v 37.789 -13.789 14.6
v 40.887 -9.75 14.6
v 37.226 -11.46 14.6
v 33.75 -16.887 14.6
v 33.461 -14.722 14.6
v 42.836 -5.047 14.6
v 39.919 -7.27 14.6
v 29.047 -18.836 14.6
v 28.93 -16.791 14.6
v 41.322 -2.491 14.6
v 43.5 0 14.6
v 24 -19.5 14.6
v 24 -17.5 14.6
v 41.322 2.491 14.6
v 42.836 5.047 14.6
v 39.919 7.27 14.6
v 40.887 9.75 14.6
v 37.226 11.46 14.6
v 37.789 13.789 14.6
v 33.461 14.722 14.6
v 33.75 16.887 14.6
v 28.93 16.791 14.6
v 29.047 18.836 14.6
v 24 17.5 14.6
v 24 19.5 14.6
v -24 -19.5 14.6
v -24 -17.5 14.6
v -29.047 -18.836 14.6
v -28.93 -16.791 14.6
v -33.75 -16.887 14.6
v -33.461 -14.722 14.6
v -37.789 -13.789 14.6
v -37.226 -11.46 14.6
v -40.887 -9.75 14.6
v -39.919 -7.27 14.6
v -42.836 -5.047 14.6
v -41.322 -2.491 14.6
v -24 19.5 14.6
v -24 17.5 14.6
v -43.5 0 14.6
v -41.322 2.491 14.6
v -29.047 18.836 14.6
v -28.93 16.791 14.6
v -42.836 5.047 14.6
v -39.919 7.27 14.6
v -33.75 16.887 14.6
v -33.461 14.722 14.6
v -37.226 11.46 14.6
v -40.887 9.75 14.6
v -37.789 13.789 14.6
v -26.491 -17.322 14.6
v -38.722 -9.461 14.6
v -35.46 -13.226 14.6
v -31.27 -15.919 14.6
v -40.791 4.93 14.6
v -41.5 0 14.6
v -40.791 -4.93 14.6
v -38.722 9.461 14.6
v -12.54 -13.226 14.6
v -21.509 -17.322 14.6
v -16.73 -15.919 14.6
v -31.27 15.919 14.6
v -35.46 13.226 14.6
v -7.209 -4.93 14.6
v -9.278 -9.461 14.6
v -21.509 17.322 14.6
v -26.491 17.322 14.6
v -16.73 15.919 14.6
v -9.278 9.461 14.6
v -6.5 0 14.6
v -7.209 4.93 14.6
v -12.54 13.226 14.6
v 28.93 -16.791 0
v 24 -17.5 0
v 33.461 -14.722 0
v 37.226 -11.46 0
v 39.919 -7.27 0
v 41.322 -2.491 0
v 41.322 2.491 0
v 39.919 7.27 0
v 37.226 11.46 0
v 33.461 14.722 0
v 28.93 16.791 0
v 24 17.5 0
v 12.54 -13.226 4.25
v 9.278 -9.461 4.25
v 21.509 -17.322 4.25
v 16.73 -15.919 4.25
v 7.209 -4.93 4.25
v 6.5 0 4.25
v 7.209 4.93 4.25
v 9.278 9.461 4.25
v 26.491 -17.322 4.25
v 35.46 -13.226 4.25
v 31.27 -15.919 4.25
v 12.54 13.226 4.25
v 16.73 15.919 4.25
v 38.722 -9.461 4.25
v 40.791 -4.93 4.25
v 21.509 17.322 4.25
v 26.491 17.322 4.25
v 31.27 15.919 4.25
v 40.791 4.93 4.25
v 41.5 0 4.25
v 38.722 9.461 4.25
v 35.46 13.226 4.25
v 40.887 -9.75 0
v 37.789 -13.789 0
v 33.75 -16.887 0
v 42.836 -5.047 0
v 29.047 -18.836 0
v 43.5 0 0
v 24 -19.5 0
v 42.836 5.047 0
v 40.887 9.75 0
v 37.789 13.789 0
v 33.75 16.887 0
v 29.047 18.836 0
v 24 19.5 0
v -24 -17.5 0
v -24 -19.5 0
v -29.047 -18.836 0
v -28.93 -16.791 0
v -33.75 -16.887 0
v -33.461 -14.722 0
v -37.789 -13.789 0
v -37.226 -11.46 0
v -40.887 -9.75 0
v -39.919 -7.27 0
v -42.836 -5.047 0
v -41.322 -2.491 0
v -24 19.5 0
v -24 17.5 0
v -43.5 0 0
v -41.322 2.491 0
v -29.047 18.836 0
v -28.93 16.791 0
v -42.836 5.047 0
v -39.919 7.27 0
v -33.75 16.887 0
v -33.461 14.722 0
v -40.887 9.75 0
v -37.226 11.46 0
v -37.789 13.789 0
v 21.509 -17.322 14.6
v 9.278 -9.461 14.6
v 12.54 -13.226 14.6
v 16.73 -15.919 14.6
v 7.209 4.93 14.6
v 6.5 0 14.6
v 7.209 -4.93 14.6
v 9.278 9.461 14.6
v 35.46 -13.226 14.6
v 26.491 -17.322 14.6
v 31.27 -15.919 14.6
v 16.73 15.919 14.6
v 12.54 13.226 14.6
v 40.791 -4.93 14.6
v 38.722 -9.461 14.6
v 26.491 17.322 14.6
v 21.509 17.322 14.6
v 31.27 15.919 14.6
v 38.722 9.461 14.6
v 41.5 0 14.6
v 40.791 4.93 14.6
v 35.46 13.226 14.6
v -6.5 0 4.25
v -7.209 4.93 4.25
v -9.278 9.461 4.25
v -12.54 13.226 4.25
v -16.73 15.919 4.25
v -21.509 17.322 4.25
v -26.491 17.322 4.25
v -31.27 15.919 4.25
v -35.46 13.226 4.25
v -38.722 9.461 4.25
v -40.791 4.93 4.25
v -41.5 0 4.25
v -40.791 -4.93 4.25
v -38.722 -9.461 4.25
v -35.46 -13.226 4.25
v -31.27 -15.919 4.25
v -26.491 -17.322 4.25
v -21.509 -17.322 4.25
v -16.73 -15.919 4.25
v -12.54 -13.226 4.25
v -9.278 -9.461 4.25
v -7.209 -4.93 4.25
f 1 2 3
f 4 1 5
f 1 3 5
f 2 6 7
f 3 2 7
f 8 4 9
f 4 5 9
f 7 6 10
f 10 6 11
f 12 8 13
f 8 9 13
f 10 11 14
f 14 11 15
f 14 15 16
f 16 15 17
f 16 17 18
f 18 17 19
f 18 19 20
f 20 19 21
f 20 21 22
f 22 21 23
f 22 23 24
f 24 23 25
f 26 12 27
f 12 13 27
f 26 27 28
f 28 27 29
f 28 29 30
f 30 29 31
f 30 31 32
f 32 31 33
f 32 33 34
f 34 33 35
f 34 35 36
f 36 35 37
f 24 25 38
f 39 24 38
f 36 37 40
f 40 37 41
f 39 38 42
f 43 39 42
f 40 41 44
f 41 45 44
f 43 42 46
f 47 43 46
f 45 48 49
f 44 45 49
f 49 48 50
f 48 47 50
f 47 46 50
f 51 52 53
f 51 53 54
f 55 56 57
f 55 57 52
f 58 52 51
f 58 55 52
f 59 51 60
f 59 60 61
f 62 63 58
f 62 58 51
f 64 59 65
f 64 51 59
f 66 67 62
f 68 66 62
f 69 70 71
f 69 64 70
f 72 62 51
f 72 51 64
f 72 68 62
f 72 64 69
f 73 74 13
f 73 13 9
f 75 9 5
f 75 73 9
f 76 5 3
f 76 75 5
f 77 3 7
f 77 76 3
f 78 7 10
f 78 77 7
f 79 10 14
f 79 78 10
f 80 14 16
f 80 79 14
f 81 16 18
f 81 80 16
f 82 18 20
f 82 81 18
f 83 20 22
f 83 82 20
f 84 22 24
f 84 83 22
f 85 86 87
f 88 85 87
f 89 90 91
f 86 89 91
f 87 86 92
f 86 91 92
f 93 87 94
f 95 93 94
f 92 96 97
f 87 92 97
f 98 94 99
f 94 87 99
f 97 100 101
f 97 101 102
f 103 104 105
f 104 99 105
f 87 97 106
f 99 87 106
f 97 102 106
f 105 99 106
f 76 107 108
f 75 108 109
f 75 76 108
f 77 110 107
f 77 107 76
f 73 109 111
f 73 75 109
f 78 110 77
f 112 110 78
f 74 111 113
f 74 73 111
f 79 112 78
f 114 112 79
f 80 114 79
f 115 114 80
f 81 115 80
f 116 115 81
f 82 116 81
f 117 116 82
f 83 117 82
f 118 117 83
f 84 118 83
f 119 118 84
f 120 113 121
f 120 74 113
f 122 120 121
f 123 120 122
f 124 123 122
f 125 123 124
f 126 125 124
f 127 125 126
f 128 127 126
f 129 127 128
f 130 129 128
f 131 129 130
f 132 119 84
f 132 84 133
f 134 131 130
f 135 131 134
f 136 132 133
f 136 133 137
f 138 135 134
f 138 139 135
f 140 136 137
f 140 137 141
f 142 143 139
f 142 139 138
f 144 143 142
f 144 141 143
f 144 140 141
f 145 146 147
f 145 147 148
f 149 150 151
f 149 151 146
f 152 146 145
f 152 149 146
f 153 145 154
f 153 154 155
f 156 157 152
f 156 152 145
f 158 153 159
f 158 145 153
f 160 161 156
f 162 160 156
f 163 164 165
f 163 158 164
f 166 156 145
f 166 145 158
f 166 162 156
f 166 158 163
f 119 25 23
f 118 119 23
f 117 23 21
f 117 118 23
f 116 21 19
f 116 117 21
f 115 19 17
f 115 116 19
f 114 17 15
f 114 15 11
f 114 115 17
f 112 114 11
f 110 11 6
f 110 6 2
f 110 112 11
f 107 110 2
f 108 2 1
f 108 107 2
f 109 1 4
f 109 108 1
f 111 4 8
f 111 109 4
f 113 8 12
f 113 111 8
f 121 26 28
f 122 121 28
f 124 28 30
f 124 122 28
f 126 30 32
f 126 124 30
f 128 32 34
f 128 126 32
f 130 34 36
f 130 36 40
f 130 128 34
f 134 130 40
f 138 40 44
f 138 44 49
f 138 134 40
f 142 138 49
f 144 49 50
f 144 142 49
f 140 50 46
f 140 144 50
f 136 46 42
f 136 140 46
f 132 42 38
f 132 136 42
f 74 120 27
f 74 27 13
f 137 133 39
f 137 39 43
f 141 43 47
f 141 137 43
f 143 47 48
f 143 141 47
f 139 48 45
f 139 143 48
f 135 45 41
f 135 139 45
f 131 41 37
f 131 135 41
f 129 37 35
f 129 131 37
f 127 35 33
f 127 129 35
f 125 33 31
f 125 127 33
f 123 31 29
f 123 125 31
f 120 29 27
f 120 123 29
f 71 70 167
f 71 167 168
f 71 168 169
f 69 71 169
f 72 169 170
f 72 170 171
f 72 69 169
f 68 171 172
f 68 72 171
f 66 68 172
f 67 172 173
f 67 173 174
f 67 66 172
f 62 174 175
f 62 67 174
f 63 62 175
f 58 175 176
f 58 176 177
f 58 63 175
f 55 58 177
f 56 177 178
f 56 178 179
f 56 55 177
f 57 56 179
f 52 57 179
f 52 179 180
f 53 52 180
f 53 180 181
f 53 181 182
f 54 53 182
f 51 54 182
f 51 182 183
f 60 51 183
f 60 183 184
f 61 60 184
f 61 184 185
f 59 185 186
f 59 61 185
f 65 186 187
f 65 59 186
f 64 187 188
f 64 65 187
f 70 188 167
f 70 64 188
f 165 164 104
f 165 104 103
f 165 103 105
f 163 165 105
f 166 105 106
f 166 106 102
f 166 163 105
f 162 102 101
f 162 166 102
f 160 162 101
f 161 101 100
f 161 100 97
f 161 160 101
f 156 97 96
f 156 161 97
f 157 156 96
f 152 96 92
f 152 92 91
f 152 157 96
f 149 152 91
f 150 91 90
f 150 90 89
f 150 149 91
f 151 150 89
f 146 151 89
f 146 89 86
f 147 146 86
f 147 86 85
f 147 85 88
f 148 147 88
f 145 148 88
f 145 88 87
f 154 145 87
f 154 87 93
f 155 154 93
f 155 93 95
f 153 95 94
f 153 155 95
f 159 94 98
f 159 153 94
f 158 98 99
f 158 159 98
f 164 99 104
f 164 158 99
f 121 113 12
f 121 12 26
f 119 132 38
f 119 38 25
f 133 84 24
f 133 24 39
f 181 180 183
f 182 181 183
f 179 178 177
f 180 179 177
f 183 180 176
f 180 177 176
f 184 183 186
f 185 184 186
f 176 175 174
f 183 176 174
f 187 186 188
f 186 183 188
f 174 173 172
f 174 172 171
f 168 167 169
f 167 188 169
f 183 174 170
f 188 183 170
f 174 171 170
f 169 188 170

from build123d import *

# Parameters (mm, degrees)
BOSS_EXTRUDE1_DEPTH   = 14.6
SKETCH2_R             = 17.5
BOSS_EXTRUDE2_DEPTH   = 10.35
BOSS_EXTRUDE2_2_DEPTH = 10.35


with BuildPart() as part:
    # Sketch1 → Boss-Extrude1 (new body)
    with BuildSketch(Plane.XY):
        with BuildLine():
            Line((-24, 19.5), (24, 19.5))
            ThreePointArc((24, 19.5), (43.5, 0), (24, -19.5))
            Line((24, -19.5), (-24, -19.5))
            ThreePointArc((-24, -19.5), (-43.5, 0), (-24, 19.5))
        make_face()
        with BuildLine():
            Line((24, 17.5), (-24, 17.5))
            ThreePointArc((-24, 17.5), (-41.5, 0), (-24, -17.5))
            Line((-24, -17.5), (24, -17.5))
            ThreePointArc((24, -17.5), (41.5, 0), (24, 17.5))
        make_face(mode=Mode.SUBTRACT)
    extrude(amount=BOSS_EXTRUDE1_DEPTH)


with BuildPart() as body_2:
    # Sketch2 → Boss-Extrude2 (new body)
    with BuildSketch(Plane.XY.offset(14.6)):
        with Locations((-24, 0)):
            Circle(SKETCH2_R)
    extrude(amount=-BOSS_EXTRUDE2_DEPTH)


with BuildPart() as body_3:
    # Sketch2 → Boss-Extrude2 2 (new body)
    with BuildSketch(Plane.XY.offset(14.6)):
        with Locations((24, 0)):
            Circle(SKETCH2_R)
    extrude(amount=-BOSS_EXTRUDE2_2_DEPTH)


solid = Compound([part.part, body_2.part, body_3.part])
